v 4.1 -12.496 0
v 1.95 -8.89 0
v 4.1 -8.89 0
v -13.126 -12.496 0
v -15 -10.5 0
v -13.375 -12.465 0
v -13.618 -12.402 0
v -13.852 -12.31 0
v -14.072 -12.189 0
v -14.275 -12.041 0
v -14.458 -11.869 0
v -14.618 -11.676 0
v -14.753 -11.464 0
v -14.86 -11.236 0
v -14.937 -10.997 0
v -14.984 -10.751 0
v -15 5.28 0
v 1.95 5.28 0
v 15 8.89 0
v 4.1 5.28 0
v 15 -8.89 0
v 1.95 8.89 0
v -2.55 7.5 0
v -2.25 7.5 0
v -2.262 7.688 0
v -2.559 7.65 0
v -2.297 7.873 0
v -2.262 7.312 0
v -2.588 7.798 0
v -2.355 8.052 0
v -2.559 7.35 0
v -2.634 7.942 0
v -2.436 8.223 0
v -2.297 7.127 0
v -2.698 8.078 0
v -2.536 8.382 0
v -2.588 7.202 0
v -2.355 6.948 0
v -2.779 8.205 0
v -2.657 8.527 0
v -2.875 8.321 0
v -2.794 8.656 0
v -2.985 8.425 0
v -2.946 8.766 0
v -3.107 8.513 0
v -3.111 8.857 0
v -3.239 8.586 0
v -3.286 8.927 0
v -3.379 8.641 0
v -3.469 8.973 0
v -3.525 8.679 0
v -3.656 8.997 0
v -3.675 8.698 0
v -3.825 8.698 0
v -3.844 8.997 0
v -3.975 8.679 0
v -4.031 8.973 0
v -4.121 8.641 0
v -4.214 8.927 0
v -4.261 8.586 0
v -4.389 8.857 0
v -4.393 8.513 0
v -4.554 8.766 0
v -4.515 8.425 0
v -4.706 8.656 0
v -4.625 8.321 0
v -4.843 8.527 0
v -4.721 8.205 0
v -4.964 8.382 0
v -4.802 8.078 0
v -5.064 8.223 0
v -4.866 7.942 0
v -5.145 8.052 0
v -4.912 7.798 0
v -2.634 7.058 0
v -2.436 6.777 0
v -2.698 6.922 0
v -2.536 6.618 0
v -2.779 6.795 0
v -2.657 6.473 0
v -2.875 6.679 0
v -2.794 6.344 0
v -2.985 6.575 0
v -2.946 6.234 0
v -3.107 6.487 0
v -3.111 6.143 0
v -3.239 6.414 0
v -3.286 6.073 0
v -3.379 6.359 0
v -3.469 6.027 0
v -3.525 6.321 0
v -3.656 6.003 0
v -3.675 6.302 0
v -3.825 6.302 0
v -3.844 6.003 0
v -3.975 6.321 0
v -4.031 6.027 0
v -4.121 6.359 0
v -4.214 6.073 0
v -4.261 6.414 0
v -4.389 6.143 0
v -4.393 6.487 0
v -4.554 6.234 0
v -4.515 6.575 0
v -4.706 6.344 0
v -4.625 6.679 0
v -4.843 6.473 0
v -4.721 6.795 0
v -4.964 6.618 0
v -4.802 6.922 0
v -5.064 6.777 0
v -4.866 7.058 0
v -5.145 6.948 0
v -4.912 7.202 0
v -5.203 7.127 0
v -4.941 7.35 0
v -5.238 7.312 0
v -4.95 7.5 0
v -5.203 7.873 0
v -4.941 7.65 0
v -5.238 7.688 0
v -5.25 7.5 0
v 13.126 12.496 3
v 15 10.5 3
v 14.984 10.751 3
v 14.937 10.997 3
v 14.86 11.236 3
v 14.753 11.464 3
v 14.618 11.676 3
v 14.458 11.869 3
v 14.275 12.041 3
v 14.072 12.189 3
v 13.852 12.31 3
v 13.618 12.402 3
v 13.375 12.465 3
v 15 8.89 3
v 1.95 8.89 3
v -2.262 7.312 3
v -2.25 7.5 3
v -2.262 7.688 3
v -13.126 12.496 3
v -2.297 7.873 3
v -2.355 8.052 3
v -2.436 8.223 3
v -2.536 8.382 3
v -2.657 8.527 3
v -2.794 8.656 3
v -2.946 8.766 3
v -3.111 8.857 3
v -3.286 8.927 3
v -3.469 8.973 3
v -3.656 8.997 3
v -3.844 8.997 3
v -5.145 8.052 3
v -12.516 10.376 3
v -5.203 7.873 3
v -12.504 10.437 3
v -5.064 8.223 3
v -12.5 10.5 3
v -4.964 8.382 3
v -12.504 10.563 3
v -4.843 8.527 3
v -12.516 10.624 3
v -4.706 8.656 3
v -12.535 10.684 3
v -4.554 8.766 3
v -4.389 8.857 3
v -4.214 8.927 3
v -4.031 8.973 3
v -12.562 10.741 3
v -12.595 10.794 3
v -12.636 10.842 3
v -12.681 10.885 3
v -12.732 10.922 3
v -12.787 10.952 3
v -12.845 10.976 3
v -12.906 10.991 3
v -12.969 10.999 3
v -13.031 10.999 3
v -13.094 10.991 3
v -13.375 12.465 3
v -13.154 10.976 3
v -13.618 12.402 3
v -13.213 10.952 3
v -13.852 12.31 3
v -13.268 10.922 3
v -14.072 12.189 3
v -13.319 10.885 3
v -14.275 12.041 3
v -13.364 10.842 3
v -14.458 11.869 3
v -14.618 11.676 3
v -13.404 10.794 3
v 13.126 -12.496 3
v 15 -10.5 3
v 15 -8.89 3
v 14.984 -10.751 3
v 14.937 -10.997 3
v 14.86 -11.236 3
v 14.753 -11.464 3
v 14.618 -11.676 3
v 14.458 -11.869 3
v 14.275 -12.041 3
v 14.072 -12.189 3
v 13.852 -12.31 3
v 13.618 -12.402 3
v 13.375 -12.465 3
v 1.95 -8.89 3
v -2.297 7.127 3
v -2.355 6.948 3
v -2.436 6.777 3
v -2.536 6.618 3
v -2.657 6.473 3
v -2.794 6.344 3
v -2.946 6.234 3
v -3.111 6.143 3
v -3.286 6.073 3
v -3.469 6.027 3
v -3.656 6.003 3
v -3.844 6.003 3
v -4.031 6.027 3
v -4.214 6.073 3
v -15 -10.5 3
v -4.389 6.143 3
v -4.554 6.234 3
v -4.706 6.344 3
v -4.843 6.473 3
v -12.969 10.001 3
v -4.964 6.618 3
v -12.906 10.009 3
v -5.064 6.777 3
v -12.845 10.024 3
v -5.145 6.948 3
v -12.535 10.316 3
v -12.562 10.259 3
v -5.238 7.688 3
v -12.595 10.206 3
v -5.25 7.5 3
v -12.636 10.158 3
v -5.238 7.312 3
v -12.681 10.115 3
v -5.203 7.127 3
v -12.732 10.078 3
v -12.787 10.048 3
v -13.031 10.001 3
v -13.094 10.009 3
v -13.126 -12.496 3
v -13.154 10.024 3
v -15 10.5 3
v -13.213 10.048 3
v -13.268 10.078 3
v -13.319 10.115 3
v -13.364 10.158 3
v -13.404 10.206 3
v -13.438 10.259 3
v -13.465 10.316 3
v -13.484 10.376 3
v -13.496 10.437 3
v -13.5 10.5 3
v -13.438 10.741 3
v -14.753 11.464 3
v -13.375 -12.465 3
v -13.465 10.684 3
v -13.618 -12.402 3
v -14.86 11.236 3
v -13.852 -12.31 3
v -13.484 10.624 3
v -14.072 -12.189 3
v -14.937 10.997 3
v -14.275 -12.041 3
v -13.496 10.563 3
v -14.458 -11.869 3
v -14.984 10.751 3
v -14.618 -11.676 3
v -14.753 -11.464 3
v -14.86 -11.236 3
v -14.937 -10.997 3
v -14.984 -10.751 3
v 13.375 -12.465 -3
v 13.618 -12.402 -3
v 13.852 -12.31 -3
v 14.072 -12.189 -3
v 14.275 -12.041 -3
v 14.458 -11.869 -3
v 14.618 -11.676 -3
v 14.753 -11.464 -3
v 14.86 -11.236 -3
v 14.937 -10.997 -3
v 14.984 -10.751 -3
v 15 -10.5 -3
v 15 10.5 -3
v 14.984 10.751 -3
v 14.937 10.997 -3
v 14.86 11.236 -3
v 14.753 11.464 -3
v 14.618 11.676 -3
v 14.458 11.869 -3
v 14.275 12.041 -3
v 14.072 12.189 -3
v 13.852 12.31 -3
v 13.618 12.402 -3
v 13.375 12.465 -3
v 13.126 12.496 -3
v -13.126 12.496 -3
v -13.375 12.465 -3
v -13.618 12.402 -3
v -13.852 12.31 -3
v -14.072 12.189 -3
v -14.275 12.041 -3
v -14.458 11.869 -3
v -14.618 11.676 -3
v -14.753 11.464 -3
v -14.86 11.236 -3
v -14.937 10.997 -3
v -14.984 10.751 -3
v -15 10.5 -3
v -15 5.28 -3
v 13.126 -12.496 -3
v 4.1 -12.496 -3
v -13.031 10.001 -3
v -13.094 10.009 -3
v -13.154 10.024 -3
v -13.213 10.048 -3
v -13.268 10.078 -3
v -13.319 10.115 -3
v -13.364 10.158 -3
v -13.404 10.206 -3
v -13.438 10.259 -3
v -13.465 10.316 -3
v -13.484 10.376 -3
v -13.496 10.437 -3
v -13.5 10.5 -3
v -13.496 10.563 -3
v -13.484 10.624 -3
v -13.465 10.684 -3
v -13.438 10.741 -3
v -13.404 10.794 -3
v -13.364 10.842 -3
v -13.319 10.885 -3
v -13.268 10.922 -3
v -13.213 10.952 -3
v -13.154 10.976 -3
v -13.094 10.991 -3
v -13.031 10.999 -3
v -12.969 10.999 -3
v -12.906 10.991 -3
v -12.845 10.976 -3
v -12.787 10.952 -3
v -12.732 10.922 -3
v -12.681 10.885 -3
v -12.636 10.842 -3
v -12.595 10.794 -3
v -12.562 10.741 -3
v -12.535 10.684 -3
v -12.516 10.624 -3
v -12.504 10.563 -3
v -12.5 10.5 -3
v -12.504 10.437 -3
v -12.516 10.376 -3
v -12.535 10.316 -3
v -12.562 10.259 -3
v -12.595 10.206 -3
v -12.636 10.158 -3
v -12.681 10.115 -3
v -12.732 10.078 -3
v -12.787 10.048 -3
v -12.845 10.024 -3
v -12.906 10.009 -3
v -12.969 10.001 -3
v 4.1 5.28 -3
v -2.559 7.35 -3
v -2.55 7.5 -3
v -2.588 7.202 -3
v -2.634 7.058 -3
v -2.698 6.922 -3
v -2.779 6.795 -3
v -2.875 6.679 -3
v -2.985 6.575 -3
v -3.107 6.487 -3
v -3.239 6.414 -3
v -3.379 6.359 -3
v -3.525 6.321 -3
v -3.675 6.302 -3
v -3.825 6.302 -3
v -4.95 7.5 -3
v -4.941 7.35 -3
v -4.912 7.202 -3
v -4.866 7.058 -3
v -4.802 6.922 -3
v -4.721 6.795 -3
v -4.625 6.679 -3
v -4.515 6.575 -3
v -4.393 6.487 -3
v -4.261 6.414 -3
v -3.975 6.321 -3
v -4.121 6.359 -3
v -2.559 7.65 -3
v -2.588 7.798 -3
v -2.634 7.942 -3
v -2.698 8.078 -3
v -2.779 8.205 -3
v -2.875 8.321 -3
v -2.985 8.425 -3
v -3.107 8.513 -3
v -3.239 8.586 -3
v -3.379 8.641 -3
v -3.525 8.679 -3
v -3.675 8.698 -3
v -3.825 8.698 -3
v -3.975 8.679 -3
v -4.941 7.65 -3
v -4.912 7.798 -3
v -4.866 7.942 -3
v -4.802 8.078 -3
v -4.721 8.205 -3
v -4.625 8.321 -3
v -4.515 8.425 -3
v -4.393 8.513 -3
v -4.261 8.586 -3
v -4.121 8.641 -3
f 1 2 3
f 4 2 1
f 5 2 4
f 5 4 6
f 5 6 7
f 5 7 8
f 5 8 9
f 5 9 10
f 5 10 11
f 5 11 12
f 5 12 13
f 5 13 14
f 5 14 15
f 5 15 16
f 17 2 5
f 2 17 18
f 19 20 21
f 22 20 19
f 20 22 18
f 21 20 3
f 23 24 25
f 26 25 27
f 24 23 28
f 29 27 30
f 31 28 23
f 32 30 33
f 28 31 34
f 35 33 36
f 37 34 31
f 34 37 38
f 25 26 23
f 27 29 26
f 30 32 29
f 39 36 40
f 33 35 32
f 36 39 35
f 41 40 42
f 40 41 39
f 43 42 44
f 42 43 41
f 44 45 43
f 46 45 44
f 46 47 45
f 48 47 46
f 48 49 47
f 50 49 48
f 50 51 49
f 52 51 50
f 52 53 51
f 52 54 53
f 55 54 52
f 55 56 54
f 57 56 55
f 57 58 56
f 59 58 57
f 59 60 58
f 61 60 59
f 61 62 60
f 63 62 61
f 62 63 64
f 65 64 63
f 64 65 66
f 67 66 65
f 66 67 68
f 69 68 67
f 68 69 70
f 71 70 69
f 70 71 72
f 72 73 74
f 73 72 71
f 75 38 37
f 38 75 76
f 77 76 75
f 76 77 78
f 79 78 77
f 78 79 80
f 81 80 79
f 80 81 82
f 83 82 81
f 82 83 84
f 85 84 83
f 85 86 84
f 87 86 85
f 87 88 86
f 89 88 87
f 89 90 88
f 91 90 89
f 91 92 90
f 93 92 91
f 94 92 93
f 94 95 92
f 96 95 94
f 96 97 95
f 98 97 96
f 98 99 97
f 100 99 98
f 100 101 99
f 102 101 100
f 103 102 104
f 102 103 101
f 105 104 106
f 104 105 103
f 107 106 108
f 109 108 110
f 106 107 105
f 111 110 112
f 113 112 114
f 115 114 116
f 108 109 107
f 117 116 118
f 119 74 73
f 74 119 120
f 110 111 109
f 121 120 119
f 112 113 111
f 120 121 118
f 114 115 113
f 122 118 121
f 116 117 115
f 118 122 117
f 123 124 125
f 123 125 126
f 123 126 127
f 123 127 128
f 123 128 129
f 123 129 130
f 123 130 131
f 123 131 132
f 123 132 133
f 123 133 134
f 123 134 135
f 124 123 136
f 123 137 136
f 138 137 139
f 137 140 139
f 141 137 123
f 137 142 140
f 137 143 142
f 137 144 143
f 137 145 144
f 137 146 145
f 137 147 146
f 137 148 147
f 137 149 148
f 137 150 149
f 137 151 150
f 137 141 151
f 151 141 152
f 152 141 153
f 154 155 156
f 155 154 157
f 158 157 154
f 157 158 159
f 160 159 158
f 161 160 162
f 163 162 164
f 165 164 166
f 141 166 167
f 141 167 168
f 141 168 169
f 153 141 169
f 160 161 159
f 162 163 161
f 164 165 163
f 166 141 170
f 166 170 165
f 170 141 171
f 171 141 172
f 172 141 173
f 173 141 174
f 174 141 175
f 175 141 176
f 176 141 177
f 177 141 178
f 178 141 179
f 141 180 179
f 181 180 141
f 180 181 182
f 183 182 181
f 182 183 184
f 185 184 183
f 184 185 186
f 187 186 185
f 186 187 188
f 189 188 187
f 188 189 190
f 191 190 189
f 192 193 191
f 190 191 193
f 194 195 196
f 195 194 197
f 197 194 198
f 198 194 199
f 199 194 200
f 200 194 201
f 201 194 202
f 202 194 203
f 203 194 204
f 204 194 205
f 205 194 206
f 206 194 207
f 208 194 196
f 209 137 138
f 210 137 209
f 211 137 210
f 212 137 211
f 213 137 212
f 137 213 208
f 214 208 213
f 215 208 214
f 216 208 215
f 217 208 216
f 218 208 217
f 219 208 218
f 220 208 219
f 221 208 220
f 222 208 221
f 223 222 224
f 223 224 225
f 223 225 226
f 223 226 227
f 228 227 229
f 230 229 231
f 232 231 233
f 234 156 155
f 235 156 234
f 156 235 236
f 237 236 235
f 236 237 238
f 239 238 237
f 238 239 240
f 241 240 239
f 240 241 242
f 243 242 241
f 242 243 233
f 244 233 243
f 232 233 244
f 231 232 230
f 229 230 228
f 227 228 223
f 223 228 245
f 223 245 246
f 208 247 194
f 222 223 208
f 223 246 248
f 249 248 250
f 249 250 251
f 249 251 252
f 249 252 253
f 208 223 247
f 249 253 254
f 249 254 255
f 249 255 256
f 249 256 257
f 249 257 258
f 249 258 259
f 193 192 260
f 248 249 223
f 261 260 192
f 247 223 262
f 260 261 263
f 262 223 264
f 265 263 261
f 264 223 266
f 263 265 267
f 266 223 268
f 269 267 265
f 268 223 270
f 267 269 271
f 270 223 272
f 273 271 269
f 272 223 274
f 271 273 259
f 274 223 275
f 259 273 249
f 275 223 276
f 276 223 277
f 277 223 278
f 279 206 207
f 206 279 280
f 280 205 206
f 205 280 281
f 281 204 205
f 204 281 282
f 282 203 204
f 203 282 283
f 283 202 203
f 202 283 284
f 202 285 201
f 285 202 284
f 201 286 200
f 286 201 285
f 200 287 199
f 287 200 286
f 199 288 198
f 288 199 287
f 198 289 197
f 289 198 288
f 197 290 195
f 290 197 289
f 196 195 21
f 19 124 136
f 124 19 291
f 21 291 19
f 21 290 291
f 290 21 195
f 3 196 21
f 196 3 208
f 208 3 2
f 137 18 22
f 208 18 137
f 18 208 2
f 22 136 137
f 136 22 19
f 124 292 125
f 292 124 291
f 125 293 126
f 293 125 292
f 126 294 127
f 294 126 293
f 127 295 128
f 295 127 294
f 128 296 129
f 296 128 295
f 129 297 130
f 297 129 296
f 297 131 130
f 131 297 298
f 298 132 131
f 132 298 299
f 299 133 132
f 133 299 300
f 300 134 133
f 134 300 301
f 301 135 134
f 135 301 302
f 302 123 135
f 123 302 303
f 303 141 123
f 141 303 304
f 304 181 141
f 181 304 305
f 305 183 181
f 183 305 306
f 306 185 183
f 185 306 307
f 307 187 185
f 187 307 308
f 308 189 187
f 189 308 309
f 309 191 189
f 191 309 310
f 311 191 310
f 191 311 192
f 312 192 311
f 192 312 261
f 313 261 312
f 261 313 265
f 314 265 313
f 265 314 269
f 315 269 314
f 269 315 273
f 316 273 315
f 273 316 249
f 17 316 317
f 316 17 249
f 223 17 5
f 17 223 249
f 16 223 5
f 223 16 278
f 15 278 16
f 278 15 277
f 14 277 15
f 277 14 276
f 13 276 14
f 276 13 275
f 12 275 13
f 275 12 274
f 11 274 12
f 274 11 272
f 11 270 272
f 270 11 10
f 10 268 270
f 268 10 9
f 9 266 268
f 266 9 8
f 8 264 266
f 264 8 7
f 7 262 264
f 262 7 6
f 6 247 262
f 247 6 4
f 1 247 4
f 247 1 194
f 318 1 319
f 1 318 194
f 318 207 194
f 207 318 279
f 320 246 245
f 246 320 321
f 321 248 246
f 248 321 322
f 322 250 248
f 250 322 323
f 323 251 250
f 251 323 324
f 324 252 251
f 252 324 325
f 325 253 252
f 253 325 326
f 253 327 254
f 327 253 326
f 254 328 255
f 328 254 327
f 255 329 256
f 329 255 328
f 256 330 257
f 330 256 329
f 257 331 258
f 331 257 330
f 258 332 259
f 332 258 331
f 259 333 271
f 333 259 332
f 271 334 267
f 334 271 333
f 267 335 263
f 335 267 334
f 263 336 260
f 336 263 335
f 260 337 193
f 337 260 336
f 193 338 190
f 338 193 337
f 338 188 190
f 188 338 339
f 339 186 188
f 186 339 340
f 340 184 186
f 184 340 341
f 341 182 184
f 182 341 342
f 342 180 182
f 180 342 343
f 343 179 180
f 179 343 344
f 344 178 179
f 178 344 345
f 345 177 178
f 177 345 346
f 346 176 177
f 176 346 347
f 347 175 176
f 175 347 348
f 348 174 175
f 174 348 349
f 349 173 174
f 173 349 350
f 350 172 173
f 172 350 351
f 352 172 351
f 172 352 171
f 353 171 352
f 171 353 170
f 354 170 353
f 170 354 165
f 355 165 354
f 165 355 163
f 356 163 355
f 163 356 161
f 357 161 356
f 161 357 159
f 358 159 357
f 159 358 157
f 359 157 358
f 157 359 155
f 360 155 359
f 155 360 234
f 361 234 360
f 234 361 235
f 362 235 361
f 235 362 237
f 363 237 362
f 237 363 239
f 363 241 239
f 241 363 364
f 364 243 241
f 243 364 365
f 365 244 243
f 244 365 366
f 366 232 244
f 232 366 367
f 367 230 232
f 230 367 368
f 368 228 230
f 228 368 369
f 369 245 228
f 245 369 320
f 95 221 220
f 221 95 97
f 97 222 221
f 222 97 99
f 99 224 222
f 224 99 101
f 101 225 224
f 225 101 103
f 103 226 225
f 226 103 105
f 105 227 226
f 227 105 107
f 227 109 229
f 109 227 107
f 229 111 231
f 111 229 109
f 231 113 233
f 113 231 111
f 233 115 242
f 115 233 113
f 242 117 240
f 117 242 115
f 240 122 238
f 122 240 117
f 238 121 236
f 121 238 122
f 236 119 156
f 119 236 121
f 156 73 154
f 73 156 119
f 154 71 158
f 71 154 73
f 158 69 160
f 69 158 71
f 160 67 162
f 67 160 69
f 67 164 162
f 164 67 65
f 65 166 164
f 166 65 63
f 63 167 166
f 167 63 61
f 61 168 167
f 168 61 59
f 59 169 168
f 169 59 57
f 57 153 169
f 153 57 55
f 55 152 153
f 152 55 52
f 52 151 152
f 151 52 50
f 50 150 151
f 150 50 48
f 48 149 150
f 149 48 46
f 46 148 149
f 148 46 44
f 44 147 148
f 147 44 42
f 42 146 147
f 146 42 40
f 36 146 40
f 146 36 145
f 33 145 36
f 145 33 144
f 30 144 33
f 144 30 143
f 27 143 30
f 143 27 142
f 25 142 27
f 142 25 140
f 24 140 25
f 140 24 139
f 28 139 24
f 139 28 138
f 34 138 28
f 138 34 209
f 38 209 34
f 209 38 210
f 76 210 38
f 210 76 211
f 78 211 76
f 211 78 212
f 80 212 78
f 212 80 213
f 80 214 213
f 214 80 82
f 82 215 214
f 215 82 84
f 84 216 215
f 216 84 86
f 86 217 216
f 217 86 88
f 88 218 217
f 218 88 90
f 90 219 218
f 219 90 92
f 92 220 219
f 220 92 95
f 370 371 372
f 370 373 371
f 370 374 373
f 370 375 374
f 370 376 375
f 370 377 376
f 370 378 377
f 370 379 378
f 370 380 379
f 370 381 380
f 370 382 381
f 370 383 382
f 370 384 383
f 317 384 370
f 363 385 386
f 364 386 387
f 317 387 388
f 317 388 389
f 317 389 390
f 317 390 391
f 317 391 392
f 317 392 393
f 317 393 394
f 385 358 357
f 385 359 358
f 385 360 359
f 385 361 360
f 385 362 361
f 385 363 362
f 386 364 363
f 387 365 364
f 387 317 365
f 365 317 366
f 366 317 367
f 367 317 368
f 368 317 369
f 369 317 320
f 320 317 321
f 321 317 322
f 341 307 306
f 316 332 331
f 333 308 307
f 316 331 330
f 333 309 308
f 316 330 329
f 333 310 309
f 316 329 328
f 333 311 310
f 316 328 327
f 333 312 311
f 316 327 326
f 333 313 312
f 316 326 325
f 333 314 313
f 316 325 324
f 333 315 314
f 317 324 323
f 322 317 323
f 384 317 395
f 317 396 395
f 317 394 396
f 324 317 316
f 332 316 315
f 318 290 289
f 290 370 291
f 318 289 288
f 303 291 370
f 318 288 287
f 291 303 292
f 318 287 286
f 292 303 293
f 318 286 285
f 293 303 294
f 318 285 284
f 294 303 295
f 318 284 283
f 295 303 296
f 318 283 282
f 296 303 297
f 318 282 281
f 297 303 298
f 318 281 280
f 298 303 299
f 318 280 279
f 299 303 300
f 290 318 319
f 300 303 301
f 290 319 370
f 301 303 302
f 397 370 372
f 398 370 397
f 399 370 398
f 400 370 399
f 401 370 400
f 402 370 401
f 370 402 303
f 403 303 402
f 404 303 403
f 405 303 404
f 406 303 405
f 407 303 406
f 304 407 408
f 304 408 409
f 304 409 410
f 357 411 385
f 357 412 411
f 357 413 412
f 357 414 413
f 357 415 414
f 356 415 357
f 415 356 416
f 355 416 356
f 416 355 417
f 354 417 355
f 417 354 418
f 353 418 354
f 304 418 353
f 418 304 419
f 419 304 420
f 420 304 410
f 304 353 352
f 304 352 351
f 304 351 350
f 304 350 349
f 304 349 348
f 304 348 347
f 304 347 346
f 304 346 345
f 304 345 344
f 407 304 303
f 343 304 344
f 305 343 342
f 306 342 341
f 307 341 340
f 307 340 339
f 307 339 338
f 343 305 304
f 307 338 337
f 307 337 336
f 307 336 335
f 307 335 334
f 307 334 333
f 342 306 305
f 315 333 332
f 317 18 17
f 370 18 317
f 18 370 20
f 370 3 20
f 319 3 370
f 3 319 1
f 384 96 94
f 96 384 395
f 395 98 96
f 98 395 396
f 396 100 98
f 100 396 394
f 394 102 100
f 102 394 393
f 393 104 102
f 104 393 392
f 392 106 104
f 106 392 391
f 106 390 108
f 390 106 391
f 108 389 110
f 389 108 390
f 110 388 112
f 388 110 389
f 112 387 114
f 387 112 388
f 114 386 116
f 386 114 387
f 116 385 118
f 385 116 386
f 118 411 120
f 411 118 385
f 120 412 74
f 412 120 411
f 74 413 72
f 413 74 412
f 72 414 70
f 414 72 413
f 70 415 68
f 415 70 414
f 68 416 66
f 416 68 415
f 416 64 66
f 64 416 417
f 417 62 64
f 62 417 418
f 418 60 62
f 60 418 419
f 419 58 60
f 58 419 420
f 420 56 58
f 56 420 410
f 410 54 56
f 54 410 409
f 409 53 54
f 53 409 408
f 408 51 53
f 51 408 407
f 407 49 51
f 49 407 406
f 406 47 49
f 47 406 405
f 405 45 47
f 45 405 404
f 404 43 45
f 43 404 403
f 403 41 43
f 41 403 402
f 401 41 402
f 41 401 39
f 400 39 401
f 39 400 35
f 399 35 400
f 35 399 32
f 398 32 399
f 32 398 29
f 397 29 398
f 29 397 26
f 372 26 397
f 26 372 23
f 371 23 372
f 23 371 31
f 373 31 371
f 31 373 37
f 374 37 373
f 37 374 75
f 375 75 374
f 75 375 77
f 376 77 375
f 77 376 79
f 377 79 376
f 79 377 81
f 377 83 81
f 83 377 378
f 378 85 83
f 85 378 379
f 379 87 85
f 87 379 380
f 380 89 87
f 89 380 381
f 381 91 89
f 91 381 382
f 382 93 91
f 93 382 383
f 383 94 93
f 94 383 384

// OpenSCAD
$fn=50;
ovDim=[30,25,3];
rad=2;
hOffset=[(239.5-202)/2,5];
conDim=([13,7*2.54,2.54]);
fudge=0.1;

color("orange",0.5) linear_extrude(ovDim.z) difference(){
  hull() for (ix=[-1,1],iy=[-1,1])
    translate([ix*(ovDim.x/2-rad),iy*(ovDim.y/2-rad)]) circle(r=rad);
  translate([ovDim.x/2-hOffset.x,ovDim.y/2-hOffset.y]) circle(d=3);
  translate([rad,-rad]-[ovDim.x/2,-ovDim.y/2]) circle(d=1);
  translate([ovDim.x/2-conDim.x/2,0]) square([conDim.x+fudge,conDim.y],true);
}

translate([0,0,-ovDim.z]) linear_extrude(ovDim.z) difference(){
  hull() for (ix=[-1,1],iy=[-1,1])
    translate([ix*(ovDim.x/2-rad),iy*(ovDim.y/2-rad)]) circle(r=rad);
  translate([ovDim.x/2-hOffset.x,ovDim.y/2-hOffset.y]) circle(d=2.4);
  translate([rad,-rad]-[ovDim.x/2,-ovDim.y/2]) circle(d=1);
  translate([-ovDim.x/2,-ovDim.y/2]) square([ovDim.x-conDim.x+rad+fudge,conDim.y]);
}
